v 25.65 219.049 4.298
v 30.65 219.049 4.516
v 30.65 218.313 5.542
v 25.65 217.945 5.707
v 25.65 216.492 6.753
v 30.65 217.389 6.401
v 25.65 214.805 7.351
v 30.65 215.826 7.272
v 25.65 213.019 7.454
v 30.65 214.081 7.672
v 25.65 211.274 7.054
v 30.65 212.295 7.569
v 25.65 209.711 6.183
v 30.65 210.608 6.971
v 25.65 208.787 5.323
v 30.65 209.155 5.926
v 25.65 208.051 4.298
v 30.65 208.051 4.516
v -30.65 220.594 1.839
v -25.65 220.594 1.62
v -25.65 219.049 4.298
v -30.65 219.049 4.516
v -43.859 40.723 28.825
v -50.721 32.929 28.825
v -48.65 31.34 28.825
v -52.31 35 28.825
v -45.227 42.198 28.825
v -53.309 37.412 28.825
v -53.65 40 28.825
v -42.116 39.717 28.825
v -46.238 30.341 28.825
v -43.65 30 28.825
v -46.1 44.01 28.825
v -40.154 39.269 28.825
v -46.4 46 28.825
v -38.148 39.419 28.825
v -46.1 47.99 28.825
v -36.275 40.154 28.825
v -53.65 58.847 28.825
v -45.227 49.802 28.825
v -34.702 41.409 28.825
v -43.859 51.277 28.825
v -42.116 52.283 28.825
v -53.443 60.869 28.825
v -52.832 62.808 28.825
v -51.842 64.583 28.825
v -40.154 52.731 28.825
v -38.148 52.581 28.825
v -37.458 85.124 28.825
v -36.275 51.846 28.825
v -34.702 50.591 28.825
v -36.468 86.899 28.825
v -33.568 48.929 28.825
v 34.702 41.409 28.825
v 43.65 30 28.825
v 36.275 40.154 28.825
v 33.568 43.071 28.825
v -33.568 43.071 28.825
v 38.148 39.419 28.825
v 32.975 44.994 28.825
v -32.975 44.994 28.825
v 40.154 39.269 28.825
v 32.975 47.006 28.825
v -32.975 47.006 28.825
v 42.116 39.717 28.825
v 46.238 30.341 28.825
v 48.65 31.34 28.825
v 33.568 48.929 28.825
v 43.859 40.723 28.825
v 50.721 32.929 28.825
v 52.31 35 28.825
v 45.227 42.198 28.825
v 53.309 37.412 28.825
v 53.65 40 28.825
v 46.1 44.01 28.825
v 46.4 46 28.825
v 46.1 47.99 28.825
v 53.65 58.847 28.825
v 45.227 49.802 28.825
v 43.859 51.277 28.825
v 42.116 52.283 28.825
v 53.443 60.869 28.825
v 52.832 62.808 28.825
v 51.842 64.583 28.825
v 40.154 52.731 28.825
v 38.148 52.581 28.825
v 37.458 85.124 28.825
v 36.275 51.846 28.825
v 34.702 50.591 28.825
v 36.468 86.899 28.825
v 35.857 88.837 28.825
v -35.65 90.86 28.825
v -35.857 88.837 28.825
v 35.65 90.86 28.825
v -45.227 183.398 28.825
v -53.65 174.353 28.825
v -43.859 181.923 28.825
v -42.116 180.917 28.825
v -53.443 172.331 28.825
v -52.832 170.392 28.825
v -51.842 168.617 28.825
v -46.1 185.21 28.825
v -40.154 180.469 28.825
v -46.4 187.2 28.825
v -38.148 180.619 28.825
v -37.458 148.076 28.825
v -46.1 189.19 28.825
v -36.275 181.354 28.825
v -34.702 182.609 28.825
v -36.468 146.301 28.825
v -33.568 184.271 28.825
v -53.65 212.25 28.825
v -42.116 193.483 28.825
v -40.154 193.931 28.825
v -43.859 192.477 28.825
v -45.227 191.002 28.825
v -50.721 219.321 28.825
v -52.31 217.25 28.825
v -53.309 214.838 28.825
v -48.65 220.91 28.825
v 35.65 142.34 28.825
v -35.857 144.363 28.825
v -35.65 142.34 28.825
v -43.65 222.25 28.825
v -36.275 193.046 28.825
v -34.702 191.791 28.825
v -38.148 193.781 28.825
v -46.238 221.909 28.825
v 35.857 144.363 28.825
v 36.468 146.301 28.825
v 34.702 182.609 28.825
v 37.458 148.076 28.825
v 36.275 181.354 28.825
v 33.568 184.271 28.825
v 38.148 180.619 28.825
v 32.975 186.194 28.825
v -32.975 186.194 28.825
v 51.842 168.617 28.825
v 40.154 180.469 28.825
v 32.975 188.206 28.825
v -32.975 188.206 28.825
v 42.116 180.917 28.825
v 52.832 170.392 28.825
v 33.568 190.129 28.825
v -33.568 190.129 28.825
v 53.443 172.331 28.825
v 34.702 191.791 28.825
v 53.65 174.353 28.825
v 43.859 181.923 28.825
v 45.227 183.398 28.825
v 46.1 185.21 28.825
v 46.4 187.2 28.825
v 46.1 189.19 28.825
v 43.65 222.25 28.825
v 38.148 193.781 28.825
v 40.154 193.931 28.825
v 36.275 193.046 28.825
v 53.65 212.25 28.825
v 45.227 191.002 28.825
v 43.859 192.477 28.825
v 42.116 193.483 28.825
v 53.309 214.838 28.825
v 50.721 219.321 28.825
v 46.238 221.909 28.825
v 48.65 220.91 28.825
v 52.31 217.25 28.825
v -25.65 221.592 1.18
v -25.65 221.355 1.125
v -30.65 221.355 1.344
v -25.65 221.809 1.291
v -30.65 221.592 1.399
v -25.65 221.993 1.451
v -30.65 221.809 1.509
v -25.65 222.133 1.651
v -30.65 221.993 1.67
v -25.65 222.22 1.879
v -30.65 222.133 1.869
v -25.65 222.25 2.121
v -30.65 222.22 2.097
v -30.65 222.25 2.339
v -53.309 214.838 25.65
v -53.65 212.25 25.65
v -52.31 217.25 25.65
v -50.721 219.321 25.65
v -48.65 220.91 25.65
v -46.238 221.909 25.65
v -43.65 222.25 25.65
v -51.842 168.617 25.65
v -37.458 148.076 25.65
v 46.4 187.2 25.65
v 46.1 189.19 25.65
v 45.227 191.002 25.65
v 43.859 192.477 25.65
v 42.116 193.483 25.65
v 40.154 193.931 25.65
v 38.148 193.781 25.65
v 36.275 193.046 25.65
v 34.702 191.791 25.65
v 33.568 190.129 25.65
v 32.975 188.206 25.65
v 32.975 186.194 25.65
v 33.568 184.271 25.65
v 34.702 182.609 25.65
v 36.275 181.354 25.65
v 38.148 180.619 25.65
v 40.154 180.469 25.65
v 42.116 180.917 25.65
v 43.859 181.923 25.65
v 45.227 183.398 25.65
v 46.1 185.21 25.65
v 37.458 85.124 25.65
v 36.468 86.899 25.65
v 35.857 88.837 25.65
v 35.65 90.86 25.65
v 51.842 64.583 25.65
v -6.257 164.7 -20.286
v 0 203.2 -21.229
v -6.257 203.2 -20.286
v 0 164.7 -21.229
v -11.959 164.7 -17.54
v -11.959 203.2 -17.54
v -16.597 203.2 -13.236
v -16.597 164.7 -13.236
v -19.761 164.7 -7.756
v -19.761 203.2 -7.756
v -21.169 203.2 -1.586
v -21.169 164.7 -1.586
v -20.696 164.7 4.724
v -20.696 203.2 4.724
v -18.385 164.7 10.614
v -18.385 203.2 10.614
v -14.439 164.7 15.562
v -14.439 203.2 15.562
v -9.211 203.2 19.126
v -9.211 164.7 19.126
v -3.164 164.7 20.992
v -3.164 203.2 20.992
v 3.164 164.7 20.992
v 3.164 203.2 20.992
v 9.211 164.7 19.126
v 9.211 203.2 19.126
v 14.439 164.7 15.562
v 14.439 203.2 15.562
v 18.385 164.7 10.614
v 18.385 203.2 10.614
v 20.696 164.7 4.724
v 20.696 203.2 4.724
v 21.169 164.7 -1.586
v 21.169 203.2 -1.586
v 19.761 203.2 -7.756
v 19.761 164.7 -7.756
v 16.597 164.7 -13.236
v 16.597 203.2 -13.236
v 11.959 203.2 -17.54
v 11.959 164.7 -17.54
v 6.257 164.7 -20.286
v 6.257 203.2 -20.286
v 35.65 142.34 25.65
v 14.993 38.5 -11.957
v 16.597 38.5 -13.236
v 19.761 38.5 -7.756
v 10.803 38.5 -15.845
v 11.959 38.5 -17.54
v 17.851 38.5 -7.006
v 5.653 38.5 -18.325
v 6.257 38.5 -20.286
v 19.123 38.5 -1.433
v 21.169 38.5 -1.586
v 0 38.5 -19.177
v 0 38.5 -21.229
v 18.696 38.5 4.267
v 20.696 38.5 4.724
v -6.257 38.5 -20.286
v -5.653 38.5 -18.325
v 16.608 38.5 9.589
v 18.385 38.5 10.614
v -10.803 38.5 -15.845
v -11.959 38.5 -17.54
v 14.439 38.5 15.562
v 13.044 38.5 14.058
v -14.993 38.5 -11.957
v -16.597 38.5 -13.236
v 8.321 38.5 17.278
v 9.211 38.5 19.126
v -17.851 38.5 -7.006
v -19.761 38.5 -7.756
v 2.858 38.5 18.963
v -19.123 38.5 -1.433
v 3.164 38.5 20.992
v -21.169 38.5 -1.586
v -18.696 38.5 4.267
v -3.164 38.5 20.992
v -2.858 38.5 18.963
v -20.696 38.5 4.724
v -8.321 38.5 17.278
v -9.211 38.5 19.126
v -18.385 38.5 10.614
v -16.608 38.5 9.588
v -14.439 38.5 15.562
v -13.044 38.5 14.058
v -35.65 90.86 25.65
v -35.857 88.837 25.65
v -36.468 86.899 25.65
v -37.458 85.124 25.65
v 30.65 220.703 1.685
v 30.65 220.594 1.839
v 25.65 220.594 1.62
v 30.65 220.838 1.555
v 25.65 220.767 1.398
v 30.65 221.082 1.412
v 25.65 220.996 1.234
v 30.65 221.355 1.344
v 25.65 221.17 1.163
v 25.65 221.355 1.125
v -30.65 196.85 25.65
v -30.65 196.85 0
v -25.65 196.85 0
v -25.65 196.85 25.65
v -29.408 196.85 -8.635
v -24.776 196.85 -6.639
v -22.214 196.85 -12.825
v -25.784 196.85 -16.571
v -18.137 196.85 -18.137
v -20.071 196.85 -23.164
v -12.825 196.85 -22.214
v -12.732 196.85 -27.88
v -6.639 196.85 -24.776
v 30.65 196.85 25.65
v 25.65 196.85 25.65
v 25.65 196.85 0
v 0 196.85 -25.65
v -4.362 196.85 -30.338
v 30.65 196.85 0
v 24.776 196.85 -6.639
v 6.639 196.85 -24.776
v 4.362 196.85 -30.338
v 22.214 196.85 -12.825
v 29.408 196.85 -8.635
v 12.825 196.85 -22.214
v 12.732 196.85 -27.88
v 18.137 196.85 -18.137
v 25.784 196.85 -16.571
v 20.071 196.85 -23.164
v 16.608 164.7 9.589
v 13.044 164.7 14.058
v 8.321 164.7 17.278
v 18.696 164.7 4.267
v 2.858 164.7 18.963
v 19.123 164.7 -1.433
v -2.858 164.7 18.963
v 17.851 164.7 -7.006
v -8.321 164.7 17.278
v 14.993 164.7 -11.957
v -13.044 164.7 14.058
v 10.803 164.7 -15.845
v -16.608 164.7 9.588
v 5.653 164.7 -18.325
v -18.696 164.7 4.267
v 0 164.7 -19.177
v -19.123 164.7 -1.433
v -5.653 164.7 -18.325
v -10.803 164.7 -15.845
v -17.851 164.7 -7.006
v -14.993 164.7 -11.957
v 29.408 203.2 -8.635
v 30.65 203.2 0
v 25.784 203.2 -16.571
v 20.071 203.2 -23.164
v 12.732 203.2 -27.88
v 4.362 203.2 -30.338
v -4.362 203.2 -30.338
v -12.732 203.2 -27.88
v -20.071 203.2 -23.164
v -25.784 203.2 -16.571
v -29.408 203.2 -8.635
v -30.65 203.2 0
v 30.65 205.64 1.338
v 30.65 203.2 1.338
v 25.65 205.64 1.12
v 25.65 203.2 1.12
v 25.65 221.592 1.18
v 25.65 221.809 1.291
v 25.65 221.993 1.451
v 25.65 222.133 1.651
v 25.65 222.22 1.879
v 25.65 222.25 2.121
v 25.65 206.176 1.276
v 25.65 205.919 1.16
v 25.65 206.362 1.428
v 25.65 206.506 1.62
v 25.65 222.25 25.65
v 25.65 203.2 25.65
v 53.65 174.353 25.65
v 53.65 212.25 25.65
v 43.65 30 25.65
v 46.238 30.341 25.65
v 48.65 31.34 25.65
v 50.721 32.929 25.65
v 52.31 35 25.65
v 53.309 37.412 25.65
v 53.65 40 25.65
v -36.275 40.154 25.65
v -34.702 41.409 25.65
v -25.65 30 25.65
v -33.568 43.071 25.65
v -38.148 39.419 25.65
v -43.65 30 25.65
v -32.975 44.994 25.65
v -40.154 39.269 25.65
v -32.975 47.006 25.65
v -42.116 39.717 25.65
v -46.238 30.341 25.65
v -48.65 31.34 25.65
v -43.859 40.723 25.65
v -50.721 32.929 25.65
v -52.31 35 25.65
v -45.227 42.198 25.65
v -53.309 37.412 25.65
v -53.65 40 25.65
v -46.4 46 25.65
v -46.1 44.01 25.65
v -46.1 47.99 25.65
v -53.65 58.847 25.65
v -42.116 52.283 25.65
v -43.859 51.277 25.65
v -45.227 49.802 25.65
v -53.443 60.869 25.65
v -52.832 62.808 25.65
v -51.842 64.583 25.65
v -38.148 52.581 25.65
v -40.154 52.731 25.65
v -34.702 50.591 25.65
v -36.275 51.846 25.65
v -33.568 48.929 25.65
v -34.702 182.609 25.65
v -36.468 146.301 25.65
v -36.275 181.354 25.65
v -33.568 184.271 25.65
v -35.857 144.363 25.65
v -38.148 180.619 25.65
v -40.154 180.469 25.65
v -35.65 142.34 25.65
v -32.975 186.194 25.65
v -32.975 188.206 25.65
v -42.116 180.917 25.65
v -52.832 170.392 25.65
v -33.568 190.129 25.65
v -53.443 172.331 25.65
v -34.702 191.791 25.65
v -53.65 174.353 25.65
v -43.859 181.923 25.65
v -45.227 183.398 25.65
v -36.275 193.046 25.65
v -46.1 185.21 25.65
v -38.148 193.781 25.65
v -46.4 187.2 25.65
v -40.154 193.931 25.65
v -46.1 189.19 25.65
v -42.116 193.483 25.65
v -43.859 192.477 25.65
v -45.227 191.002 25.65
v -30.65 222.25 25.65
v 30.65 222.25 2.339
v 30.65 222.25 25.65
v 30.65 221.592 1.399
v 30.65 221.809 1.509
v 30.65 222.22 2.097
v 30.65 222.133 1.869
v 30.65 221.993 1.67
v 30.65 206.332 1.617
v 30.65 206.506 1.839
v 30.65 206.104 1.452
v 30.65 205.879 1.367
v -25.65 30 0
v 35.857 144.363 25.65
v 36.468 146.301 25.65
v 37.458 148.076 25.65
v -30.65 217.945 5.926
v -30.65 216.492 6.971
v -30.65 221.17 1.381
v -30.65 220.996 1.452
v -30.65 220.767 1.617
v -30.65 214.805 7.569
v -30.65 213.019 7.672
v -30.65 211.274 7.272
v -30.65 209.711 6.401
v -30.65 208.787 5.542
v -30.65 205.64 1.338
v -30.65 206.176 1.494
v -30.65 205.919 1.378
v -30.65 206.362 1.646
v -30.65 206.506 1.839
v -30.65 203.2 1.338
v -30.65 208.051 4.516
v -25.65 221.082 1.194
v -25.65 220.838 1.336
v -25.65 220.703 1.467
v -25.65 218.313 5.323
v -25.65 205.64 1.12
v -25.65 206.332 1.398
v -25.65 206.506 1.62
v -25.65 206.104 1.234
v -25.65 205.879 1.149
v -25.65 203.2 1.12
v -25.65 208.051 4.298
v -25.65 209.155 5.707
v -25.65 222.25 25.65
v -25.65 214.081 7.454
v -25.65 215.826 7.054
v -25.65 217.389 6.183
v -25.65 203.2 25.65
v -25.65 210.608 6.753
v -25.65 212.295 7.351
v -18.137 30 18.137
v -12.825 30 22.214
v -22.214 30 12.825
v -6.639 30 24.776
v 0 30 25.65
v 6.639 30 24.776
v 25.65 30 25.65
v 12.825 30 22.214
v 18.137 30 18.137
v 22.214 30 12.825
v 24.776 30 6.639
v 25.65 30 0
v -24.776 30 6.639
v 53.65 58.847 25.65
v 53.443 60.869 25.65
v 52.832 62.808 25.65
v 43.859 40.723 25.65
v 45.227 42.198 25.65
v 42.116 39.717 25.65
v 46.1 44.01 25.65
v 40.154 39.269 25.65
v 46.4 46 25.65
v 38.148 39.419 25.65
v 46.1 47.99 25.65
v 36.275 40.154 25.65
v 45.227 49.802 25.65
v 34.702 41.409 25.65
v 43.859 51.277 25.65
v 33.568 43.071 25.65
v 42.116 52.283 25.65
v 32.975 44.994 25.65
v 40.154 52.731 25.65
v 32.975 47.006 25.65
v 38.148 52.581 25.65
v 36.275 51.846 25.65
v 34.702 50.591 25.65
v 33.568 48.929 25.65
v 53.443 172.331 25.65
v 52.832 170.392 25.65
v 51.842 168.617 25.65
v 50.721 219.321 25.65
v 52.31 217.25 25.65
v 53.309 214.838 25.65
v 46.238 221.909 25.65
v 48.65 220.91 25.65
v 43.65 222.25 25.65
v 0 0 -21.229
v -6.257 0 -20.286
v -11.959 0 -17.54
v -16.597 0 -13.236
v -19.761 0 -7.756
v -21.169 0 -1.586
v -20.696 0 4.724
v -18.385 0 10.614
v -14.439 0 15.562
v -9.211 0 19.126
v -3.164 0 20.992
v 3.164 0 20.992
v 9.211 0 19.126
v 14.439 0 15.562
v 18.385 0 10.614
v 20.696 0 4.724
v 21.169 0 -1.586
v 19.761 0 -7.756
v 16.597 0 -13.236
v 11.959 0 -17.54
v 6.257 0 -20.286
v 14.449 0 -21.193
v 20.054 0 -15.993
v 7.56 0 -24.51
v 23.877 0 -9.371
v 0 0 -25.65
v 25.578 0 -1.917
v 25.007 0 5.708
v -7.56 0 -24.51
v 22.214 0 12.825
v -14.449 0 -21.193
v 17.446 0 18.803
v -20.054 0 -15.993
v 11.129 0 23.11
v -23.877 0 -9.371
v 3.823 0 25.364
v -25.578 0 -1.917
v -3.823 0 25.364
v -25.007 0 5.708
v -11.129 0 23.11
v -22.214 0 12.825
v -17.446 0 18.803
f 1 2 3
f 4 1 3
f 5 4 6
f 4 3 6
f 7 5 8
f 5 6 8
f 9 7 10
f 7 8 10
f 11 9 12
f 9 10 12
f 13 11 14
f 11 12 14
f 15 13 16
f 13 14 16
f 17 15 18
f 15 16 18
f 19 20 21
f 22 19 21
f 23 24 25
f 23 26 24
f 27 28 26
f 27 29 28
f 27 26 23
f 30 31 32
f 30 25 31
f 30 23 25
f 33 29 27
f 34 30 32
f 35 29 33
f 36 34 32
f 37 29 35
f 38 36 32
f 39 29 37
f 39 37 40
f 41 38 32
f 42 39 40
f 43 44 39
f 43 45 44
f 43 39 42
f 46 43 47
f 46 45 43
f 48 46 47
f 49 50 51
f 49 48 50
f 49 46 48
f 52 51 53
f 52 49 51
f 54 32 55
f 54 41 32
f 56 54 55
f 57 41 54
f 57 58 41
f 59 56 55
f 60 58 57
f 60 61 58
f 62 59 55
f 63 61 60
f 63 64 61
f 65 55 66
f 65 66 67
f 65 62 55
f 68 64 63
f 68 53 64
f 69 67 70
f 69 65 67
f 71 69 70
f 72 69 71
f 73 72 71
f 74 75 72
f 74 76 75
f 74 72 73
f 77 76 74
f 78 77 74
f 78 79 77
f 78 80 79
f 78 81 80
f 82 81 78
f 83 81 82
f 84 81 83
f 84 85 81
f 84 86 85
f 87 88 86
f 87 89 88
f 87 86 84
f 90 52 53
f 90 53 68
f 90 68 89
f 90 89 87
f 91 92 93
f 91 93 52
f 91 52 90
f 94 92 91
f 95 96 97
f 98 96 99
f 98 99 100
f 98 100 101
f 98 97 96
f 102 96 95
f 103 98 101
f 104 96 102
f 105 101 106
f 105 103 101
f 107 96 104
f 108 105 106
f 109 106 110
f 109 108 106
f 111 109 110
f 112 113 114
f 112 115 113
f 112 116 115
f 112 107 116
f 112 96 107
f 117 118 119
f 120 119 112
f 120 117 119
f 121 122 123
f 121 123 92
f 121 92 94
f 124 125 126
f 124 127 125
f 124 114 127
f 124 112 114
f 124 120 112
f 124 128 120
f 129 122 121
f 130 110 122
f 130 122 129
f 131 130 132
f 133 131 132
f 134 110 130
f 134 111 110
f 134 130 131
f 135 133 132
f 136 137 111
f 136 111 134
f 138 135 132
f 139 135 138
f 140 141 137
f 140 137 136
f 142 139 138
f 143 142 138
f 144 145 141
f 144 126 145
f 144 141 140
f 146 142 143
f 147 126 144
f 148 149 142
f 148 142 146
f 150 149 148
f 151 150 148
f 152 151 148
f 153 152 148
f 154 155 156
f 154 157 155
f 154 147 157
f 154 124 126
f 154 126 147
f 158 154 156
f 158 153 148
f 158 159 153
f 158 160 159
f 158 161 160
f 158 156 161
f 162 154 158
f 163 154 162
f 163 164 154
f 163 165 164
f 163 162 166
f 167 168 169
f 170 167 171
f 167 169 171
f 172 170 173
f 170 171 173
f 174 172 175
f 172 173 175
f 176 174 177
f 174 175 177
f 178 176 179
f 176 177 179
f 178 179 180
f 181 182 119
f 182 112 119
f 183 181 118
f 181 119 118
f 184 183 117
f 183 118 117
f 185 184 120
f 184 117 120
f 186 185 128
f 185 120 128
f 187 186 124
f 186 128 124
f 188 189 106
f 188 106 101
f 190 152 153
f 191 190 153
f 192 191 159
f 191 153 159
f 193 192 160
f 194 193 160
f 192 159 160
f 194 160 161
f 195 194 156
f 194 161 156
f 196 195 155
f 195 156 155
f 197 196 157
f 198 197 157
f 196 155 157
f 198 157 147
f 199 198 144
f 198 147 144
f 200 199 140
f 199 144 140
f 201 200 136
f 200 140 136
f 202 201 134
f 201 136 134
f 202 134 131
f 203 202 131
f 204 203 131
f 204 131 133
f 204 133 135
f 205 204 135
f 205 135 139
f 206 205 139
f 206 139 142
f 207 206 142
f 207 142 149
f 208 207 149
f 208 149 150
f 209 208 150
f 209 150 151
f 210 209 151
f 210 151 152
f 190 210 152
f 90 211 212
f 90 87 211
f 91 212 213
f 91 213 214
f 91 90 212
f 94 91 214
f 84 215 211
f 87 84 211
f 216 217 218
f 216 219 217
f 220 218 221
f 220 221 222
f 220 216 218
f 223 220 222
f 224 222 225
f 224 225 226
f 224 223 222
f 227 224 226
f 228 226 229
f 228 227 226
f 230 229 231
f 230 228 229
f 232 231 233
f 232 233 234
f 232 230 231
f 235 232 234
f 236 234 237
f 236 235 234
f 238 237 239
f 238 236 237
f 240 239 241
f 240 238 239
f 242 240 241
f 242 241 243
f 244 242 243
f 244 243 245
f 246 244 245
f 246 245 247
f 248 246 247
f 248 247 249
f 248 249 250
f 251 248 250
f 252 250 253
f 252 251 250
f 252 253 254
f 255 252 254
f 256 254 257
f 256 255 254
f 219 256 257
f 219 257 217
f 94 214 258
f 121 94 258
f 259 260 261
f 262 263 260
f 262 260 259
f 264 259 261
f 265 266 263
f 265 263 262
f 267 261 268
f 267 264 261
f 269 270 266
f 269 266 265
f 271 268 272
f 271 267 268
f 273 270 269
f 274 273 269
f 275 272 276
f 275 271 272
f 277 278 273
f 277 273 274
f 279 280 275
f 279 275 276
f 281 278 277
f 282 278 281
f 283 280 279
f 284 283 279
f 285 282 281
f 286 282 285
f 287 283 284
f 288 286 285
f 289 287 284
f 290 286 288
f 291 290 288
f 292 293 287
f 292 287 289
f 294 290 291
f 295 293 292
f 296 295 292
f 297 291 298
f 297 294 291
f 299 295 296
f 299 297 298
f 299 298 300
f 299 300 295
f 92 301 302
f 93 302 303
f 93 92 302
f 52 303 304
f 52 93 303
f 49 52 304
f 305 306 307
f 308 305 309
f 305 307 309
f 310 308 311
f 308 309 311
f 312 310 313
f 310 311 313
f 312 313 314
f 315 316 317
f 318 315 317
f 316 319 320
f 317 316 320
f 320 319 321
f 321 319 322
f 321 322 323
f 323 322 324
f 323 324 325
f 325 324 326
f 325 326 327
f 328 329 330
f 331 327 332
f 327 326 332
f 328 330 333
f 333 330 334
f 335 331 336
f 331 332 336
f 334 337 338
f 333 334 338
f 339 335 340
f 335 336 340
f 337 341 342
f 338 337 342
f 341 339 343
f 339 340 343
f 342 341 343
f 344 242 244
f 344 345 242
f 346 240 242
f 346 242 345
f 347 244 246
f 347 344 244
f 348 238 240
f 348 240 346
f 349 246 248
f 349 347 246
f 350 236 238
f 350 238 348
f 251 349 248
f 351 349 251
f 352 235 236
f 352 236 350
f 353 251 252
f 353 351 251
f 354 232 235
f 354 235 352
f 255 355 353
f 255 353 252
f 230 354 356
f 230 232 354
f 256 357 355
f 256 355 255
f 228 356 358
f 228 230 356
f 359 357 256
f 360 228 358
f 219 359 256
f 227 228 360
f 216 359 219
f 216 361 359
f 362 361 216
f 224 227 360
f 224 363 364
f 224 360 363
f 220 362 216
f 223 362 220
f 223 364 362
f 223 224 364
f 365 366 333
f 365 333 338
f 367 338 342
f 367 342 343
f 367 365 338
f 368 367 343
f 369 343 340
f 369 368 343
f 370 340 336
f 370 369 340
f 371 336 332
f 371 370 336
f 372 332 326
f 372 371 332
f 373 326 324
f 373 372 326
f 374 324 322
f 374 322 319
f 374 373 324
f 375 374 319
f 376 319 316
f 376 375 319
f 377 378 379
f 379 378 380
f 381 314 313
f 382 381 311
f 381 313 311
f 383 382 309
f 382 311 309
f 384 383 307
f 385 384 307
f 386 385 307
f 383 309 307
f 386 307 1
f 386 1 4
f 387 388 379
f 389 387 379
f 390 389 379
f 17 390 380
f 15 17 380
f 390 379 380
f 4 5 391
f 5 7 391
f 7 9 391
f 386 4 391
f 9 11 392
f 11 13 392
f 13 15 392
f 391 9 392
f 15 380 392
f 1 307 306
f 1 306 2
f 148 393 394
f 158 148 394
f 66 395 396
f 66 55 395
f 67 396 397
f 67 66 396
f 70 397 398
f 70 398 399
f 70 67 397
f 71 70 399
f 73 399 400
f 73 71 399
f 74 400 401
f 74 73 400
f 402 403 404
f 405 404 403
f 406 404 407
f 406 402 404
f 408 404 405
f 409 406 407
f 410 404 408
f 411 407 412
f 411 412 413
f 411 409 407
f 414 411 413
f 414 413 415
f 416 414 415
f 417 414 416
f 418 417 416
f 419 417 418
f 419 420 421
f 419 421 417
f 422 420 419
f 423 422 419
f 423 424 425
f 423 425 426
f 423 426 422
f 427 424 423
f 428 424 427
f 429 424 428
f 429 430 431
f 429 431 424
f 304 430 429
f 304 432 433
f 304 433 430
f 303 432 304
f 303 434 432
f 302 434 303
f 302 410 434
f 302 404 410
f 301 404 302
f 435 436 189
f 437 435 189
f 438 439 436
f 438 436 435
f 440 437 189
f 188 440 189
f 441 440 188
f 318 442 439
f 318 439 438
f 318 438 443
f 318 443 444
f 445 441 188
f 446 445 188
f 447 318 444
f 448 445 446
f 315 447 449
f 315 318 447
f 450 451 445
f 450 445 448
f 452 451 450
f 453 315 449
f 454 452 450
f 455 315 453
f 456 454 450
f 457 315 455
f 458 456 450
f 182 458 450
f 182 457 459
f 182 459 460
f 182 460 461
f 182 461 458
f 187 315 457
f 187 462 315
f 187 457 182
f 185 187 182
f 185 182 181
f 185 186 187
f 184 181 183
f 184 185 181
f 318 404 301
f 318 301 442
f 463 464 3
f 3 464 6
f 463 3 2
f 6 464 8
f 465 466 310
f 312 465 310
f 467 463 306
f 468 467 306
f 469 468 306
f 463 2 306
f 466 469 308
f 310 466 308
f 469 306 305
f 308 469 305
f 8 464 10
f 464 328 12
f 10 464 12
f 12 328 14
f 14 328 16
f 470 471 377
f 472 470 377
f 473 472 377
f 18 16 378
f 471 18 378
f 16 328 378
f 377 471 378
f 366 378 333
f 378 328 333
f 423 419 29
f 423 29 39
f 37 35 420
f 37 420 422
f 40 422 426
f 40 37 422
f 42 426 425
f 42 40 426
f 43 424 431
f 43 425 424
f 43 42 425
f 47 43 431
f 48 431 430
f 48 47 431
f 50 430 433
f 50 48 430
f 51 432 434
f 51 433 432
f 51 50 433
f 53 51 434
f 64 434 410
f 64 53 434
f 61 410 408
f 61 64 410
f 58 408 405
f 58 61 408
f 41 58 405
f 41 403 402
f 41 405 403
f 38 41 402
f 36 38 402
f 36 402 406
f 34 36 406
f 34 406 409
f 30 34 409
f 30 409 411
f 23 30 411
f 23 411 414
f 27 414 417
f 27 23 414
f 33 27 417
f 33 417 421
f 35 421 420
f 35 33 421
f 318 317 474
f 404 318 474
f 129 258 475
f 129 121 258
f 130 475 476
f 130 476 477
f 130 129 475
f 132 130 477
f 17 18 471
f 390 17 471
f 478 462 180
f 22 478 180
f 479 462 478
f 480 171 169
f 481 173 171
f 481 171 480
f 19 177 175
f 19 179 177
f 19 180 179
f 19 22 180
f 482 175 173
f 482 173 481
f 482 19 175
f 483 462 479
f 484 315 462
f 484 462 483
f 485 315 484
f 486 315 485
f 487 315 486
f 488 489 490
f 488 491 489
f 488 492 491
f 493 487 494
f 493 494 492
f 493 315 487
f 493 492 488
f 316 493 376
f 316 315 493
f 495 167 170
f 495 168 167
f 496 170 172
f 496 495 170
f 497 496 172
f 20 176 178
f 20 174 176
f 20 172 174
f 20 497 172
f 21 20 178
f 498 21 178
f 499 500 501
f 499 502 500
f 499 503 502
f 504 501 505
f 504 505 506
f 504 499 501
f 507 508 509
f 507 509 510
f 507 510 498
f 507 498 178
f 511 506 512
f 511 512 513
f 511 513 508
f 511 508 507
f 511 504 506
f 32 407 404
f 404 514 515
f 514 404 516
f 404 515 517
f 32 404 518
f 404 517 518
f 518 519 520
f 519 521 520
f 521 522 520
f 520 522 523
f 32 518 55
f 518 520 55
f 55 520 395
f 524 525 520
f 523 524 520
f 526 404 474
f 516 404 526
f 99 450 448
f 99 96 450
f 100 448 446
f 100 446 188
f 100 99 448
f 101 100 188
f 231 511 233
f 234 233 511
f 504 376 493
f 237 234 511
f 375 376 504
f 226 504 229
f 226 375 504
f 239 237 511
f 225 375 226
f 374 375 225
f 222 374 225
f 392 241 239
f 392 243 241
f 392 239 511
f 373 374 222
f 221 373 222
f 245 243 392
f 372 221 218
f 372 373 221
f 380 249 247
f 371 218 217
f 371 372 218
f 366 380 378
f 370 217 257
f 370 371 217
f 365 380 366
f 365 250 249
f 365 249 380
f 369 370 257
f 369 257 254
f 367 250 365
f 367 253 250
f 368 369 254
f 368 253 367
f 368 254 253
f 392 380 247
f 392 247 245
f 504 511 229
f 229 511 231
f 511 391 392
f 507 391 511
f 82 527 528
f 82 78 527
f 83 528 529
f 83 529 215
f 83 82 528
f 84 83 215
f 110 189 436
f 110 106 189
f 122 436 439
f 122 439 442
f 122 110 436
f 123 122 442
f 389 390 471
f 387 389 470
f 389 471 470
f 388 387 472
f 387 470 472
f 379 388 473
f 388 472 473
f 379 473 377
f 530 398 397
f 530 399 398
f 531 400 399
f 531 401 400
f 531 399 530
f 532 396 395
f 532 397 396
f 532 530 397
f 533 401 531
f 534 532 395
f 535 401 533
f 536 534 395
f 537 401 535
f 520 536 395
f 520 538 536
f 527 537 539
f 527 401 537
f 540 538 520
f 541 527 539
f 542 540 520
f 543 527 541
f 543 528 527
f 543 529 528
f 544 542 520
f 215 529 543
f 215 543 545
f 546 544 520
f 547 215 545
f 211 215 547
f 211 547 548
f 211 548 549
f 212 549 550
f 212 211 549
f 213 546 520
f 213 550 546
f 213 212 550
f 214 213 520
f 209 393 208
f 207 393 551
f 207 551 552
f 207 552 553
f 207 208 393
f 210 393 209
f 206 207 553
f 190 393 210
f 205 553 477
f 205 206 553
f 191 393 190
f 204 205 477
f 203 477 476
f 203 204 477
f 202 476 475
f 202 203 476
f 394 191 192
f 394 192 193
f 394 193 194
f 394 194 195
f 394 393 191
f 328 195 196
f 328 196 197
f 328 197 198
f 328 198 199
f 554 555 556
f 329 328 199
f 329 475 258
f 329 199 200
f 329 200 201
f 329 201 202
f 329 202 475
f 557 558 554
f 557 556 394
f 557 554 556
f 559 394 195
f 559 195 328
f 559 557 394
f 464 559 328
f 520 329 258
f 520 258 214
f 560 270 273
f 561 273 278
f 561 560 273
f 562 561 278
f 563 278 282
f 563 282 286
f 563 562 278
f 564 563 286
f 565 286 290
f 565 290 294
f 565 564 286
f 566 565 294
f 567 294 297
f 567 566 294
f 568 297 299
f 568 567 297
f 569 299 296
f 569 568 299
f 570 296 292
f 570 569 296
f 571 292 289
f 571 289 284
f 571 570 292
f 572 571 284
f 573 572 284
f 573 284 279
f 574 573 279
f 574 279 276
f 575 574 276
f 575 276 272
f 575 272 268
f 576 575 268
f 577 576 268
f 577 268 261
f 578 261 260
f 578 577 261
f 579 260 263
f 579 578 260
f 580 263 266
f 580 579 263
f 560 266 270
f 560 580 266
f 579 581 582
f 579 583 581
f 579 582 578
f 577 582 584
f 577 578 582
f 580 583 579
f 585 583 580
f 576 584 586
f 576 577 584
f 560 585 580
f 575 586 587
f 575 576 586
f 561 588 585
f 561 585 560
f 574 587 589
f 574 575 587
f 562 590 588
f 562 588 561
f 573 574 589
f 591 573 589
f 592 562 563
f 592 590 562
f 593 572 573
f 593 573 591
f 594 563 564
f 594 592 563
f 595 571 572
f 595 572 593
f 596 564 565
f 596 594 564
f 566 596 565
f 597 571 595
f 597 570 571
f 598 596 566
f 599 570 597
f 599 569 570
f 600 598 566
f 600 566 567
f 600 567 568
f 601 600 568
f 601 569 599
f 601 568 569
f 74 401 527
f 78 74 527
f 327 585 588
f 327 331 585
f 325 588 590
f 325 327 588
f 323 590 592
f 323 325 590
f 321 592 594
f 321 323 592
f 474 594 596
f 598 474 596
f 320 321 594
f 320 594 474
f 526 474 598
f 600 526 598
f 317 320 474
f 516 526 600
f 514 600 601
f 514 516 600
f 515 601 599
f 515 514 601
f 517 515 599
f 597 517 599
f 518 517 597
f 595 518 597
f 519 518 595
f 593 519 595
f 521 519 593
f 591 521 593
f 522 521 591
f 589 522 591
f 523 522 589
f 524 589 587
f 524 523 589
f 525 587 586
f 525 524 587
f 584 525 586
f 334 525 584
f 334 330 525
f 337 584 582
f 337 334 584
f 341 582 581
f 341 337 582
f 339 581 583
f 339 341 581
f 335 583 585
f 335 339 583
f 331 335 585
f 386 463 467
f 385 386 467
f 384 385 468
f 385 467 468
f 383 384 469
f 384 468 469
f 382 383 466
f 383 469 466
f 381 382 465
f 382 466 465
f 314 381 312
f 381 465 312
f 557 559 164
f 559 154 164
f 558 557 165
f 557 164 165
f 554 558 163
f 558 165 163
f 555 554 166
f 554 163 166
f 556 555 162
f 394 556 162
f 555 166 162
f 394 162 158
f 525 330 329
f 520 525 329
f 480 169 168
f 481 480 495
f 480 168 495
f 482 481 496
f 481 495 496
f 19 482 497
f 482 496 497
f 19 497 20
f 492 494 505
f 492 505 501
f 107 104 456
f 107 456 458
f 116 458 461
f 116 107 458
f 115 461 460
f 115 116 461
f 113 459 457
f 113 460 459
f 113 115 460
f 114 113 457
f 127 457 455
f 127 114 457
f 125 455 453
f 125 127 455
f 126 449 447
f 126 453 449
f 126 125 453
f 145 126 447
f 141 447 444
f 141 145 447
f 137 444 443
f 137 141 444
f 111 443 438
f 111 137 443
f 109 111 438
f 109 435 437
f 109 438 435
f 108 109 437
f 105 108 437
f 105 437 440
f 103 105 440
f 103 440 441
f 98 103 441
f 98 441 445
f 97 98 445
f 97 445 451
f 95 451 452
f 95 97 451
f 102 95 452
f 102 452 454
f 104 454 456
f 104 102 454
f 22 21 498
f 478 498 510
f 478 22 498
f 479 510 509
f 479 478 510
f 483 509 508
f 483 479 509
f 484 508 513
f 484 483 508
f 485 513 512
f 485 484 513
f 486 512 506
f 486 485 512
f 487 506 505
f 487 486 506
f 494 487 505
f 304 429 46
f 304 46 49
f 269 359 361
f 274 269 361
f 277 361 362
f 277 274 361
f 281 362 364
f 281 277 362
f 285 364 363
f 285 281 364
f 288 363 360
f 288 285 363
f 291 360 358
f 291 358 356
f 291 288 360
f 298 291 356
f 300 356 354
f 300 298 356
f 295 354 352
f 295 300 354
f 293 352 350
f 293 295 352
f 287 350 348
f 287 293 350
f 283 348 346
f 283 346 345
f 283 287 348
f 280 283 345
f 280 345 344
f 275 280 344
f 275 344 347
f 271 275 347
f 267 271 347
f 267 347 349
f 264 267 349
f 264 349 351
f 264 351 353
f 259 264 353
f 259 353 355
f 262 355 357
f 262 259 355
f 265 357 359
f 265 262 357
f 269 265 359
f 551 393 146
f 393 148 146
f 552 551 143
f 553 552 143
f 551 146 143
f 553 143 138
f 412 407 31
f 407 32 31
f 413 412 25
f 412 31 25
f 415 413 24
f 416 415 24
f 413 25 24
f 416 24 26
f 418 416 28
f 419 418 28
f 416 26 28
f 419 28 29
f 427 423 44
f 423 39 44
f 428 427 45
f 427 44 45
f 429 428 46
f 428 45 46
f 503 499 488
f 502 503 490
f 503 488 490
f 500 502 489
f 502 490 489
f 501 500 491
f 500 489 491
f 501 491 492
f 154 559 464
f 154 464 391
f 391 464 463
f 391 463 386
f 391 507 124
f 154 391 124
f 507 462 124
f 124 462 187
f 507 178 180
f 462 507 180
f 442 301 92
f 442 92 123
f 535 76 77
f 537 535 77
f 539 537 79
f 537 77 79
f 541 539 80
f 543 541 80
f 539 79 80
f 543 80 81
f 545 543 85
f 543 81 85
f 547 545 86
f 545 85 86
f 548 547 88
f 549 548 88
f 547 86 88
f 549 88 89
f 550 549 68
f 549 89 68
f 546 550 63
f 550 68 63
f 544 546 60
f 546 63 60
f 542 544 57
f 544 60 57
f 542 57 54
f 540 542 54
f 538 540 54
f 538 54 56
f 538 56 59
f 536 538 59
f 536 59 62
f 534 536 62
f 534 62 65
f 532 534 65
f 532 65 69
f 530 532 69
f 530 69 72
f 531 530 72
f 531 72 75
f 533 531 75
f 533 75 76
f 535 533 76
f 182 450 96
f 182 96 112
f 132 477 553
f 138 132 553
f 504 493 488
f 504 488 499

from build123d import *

# Parameters (mm, degrees)
BOSS_EXTRUDE1_START   = -173.2
BOSS_EXTRUDE1_DEPTH   = 173.2
BOSS_EXTRUDE2_DEPTH   = 3.175
M12_CLEARANCE_HOLE1_D = 13.5
FILLET1_R             = 10
FILLET1_OF_MIRROR1_R  = 10
BOSS_EXTRUDE3_DEPTH   = 6.35
BOSS_EXTRUDE4_DEPTH   = 19.05
CUT_EXTRUDE1_DEPTH    = 238.82533849
FILLET2_R             = 1
FILLET2_OF_MIRROR2_R  = 1


with BuildPart() as part:
    # Sketch12 → Revolve1 (revolve)
    with BuildSketch(Plane.XY, mode=Mode.PRIVATE) as revolve1_sk:
        Polygon((-25.65, 0), (-25.65, 203.2), (-21.22866, 203.2), (-21.22866, 164.7), (-19.177, 164.7), (-19.177, 38.5), (-21.22866, 38.5), (-21.22866, 0), align=None)
    revolve(revolve1_sk.sketch.rotate(Axis((0, 0, 0), (0, 1, 0)), 270), axis=Axis((0, 0, 0), (0, 1, 0)))

    # Sketch14 → Boss-Extrude1 (add)
    with BuildSketch(Plane(origin=(0, 30, 0), x_dir=(-1, 0, 0), z_dir=(0, -1, 0)).offset(BOSS_EXTRUDE1_START)):
        with BuildLine():
            Line((-25.65, 0), (-25.65, -25.65))
            Line((-25.65, -25.65), (1.5e-08, -25.65))
            ThreePointArc((1.5e-08, -25.65), (-18.137288932, -18.137288943), (-25.65, 0))
        make_face()
        with BuildLine():
            ThreePointArc((25.65, 0), (18.137288943, -18.137288932), (1.5e-08, -25.65))
            Line((1.5e-08, -25.65), (25.65, -25.65))
            Line((25.65, -25.65), (25.65, 0))
        make_face()
    extrude(amount=BOSS_EXTRUDE1_DEPTH)

    # Sketch27 → Boss-Extrude2 (add)
    with BuildSketch(Plane.XY.offset(25.65)):
        Polygon((-25.65, 30), (53.65, 30), (53.65, 62), (35.65, 87.706664121), (35.65, 145.493335879), (53.65, 171.2), (53.65, 222.25), (-25.65, 222.25), align=None)
    boss_extrude2 = extrude(amount=BOSS_EXTRUDE2_DEPTH)

    # M12 Clearance Hole1 (through all)
    with Locations(Plane(origin=(0, 0, 25.65), x_dir=(-1, 0, 0), z_dir=(0, 0, -1))):
        with Locations((-39.65, 46), (-39.65, 187.2)):
            m12_clearance_hole1 = Hole(M12_CLEARANCE_HOLE1_D / 2)

    # Fillet1
    fillet1_edges = [part.edges().sort_by_distance(p)[0] for p in [
        (53.65, 222.25, 27.2375),
        (53.65, 30, 27.2375),
        (53.65, 62, 27.2375),
        (35.65, 87.706664121, 27.2375),
        (35.65, 145.493335879, 27.2375),
        (53.65, 171.2, 27.2375),
    ]]
    fillet(fillet1_edges, radius=FILLET1_R)

    # Mirror1: Boss-Extrude2, M12 Clearance Hole1 across plane
    add(boss_extrude2.mirror(Plane(origin=(0, 0, 0), x_dir=(0, 0, 1), z_dir=(1, 0, 0))))
    add(m12_clearance_hole1.mirror(Plane(origin=(0, 0, 0), x_dir=(0, 0, 1), z_dir=(1, 0, 0))), mode=Mode.SUBTRACT)

    # Fillet1 of Mirror1
    fillet1_of_mirror1_edges = [part.edges().sort_by_distance(p)[0] for p in [
        (-53.65, 222.25, 27.2375),
        (-53.65, 30, 27.2375),
        (-53.65, 62, 27.2375),
        (-35.65, 87.706664121, 27.2375),
        (-35.65, 145.493335879, 27.2375),
        (-53.65, 171.2, 27.2375),
    ]]
    fillet(fillet1_of_mirror1_edges, radius=FILLET1_OF_MIRROR1_R)

    # Sketch33 → Boss-Extrude3 (add)
    with BuildSketch(Plane(origin=(0, 203.2, 0), x_dir=(1, 0, 0), z_dir=(0, 1, 0))):
        with BuildLine():
            Line((30.65, -25.65), (30.65, 0))
            ThreePointArc((30.65, 0), (0, 30.65), (-30.65, 0))
            Line((-30.65, 0), (-30.65, -25.65))
            Line((-30.65, -25.65), (-25.65, -25.65))
            Line((-25.65, -25.65), (-25.65, 0))
            ThreePointArc((-25.65, 0), (0, 25.65), (25.65, 0))
            Line((25.65, 0), (25.65, -25.65))
            Line((25.65, -25.65), (30.65, -25.65))
        make_face()
        Polygon((25.65, -25.65), (30.65, -25.65), (30.65, -1.3382079), (25.65, -1.119903186), align=None)
    extrude(amount=-BOSS_EXTRUDE3_DEPTH)

    # Sketch33<3> → Boss-Extrude4 (add)
    with BuildSketch(Plane(origin=(0, 203.2, 0), x_dir=(1, 0, 0), z_dir=(0, 1, 0))):
        Polygon((25.65, -25.65), (30.65, -25.65), (30.65, -1.3382079), (25.65, -1.119903186), align=None)
    boss_extrude4 = extrude(amount=BOSS_EXTRUDE4_DEPTH)

    # Sketch34 → Cut-Extrude1 (cut, symmetric)
    with BuildSketch(Plane(origin=(24.827906129, 0, 1.084009792), x_dir=(0.043619387365336035, 0, -0.9990482215818578), z_dir=(0.9990482215818577, 0, 0.04361938736533603))):
        with BuildLine():
            ThreePointArc((0, 219.9), (-1.643500936, 219.683628997), (-3.175, 219.049261314))
            Line((-3.175, 219.049261314), (0, 213.55))
            Line((0, 213.55), (0, 219.9))
        make_face()
        with BuildLine():
            Line((0, 213.55), (-3.175, 219.049261314))
            ThreePointArc((-3.175, 219.049261314), (-6.35, 213.55), (-3.175, 208.050738686))
            Line((-3.175, 208.050738686), (0, 213.55))
        make_face()
        with BuildLine():
            Line((0, 220.882348419), (-3.175, 219.049261314))
            ThreePointArc((-3.175, 219.049261314), (-1.643500936, 219.683628997), (0, 219.9))
            Line((0, 219.9), (0, 220.882348419))
        make_face()
        with BuildLine():
            Line((0, 207.2), (0, 213.55))
            Line((0, 213.55), (-3.175, 208.050738686))
            ThreePointArc((-3.175, 208.050738686), (-1.643500936, 207.416371003), (0, 207.2))
        make_face()
        with BuildLine():
            ThreePointArc((0, 207.2), (-1.643500936, 207.416371003), (-3.175, 208.050738686))
            Line((-3.175, 208.050738686), (0, 206.217651581))
            Line((0, 206.217651581), (0, 207.2))
        make_face()
    cut_extrude1 = extrude(amount=CUT_EXTRUDE1_DEPTH, both=True, mode=Mode.SUBTRACT)

    # Fillet2
    # the kernel refuses this fillet: 1 mm, written as the material it takes off along each edge
    with BuildSketch(Plane(origin=(33.147620554, 222.25, 1.447256369), x_dir=(-0.04361938736533601, 0, 0.9990482215818578), z_dir=(-0.9990482215818578, 0, -0.043619387365336))) as fillet2_piece_1:
        with BuildLine():
            CenterArc((FILLET2_R, -FILLET2_R), FILLET2_R, 90, 90)
            Line((0, -FILLET2_R), (0, 0))
            Line((0, 0), (FILLET2_R, 0))
        make_face()
    extrude(amount=10.004763426, mode=Mode.SUBTRACT)
    with BuildSketch(Plane(origin=(24.207998101, 220.882348419, 1.056944023), x_dir=(0, 1, 0), z_dir=(0.9990482215818578, 0, 0.043619387365336035))) as fillet2_piece_2:
        with BuildLine():
            CenterArc((FILLET2_R * 0.57735026919, FILLET2_R), FILLET2_R, 210, 60)
            Line((-FILLET2_R * 0.288675134595, FILLET2_R * 0.5), (0, 0))
            Line((0, 0), (FILLET2_R * 0.57735026919, 0))
        make_face()
    extrude(amount=7.891514772, mode=Mode.SUBTRACT)
    with BuildSketch(Plane(origin=(32.092001899, 206.217651581, 1.401167063), x_dir=(-0.03777549755589492, 0.5000000000000023, 0.8652011394955523), z_dir=(-0.9990482215818578, 0, -0.043619387365336035))) as fillet2_piece_3:
        with BuildLine():
            CenterArc((FILLET2_R * 0.57735026919, -FILLET2_R), FILLET2_R, 90, 60)
            Line((-FILLET2_R * 0.288675134595, -FILLET2_R * 0.5), (0, 0))
            Line((0, 0), (FILLET2_R * 0.57735026919, 0))
        make_face()
    extrude(amount=7.891514772, mode=Mode.SUBTRACT)

    # Mirror2: Boss-Extrude4, Cut-Extrude1 across plane
    add(boss_extrude4.mirror(Plane(origin=(0, 0, 0), x_dir=(0, 0, 1), z_dir=(1, 0, 0))))
    add(cut_extrude1.mirror(Plane(origin=(0, 0, 0), x_dir=(0, 0, 1), z_dir=(1, 0, 0))), mode=Mode.SUBTRACT)

    # Fillet2 of Mirror2
    # the kernel refuses this fillet: 1 mm, written as the material it takes off along each edge
    with BuildSketch(Plane(origin=(-33.147620554, 222.25, 1.447256369), x_dir=(0.04361938736533601, 0, 0.9990482215818578), z_dir=(0.9990482215818578, 0, -0.043619387365336))) as fillet2_of_mirror2_piece_1:
        with BuildLine():
            CenterArc((FILLET2_OF_MIRROR2_R, FILLET2_OF_MIRROR2_R), FILLET2_OF_MIRROR2_R, 180, 90)
            Line((0, FILLET2_OF_MIRROR2_R), (0, 0))
            Line((0, 0), (FILLET2_OF_MIRROR2_R, 0))
        make_face()
    extrude(amount=10.004763426, mode=Mode.SUBTRACT)
    with BuildSketch(Plane(origin=(-24.207998101, 220.882348419, 1.056944023), x_dir=(0, 1, 0), z_dir=(-0.9990482215818578, 0, 0.043619387365336035)), Plane(origin=(-32.092001899, 206.217651581, 1.401167063), x_dir=(0, -1, 0), z_dir=(0.9990482215818578, 0, -0.043619387365336035))) as fillet2_of_mirror2_piece_2:
        with BuildLine():
            CenterArc((FILLET2_OF_MIRROR2_R * 0.57735026919, -FILLET2_OF_MIRROR2_R), FILLET2_OF_MIRROR2_R, 90, 60)
            Line((-FILLET2_OF_MIRROR2_R * 0.288675134595, -FILLET2_OF_MIRROR2_R * 0.5), (0, 0))
            Line((0, 0), (FILLET2_OF_MIRROR2_R * 0.57735026919, 0))
        make_face()
    extrude(amount=7.891514772, mode=Mode.SUBTRACT)


solid = part.part
